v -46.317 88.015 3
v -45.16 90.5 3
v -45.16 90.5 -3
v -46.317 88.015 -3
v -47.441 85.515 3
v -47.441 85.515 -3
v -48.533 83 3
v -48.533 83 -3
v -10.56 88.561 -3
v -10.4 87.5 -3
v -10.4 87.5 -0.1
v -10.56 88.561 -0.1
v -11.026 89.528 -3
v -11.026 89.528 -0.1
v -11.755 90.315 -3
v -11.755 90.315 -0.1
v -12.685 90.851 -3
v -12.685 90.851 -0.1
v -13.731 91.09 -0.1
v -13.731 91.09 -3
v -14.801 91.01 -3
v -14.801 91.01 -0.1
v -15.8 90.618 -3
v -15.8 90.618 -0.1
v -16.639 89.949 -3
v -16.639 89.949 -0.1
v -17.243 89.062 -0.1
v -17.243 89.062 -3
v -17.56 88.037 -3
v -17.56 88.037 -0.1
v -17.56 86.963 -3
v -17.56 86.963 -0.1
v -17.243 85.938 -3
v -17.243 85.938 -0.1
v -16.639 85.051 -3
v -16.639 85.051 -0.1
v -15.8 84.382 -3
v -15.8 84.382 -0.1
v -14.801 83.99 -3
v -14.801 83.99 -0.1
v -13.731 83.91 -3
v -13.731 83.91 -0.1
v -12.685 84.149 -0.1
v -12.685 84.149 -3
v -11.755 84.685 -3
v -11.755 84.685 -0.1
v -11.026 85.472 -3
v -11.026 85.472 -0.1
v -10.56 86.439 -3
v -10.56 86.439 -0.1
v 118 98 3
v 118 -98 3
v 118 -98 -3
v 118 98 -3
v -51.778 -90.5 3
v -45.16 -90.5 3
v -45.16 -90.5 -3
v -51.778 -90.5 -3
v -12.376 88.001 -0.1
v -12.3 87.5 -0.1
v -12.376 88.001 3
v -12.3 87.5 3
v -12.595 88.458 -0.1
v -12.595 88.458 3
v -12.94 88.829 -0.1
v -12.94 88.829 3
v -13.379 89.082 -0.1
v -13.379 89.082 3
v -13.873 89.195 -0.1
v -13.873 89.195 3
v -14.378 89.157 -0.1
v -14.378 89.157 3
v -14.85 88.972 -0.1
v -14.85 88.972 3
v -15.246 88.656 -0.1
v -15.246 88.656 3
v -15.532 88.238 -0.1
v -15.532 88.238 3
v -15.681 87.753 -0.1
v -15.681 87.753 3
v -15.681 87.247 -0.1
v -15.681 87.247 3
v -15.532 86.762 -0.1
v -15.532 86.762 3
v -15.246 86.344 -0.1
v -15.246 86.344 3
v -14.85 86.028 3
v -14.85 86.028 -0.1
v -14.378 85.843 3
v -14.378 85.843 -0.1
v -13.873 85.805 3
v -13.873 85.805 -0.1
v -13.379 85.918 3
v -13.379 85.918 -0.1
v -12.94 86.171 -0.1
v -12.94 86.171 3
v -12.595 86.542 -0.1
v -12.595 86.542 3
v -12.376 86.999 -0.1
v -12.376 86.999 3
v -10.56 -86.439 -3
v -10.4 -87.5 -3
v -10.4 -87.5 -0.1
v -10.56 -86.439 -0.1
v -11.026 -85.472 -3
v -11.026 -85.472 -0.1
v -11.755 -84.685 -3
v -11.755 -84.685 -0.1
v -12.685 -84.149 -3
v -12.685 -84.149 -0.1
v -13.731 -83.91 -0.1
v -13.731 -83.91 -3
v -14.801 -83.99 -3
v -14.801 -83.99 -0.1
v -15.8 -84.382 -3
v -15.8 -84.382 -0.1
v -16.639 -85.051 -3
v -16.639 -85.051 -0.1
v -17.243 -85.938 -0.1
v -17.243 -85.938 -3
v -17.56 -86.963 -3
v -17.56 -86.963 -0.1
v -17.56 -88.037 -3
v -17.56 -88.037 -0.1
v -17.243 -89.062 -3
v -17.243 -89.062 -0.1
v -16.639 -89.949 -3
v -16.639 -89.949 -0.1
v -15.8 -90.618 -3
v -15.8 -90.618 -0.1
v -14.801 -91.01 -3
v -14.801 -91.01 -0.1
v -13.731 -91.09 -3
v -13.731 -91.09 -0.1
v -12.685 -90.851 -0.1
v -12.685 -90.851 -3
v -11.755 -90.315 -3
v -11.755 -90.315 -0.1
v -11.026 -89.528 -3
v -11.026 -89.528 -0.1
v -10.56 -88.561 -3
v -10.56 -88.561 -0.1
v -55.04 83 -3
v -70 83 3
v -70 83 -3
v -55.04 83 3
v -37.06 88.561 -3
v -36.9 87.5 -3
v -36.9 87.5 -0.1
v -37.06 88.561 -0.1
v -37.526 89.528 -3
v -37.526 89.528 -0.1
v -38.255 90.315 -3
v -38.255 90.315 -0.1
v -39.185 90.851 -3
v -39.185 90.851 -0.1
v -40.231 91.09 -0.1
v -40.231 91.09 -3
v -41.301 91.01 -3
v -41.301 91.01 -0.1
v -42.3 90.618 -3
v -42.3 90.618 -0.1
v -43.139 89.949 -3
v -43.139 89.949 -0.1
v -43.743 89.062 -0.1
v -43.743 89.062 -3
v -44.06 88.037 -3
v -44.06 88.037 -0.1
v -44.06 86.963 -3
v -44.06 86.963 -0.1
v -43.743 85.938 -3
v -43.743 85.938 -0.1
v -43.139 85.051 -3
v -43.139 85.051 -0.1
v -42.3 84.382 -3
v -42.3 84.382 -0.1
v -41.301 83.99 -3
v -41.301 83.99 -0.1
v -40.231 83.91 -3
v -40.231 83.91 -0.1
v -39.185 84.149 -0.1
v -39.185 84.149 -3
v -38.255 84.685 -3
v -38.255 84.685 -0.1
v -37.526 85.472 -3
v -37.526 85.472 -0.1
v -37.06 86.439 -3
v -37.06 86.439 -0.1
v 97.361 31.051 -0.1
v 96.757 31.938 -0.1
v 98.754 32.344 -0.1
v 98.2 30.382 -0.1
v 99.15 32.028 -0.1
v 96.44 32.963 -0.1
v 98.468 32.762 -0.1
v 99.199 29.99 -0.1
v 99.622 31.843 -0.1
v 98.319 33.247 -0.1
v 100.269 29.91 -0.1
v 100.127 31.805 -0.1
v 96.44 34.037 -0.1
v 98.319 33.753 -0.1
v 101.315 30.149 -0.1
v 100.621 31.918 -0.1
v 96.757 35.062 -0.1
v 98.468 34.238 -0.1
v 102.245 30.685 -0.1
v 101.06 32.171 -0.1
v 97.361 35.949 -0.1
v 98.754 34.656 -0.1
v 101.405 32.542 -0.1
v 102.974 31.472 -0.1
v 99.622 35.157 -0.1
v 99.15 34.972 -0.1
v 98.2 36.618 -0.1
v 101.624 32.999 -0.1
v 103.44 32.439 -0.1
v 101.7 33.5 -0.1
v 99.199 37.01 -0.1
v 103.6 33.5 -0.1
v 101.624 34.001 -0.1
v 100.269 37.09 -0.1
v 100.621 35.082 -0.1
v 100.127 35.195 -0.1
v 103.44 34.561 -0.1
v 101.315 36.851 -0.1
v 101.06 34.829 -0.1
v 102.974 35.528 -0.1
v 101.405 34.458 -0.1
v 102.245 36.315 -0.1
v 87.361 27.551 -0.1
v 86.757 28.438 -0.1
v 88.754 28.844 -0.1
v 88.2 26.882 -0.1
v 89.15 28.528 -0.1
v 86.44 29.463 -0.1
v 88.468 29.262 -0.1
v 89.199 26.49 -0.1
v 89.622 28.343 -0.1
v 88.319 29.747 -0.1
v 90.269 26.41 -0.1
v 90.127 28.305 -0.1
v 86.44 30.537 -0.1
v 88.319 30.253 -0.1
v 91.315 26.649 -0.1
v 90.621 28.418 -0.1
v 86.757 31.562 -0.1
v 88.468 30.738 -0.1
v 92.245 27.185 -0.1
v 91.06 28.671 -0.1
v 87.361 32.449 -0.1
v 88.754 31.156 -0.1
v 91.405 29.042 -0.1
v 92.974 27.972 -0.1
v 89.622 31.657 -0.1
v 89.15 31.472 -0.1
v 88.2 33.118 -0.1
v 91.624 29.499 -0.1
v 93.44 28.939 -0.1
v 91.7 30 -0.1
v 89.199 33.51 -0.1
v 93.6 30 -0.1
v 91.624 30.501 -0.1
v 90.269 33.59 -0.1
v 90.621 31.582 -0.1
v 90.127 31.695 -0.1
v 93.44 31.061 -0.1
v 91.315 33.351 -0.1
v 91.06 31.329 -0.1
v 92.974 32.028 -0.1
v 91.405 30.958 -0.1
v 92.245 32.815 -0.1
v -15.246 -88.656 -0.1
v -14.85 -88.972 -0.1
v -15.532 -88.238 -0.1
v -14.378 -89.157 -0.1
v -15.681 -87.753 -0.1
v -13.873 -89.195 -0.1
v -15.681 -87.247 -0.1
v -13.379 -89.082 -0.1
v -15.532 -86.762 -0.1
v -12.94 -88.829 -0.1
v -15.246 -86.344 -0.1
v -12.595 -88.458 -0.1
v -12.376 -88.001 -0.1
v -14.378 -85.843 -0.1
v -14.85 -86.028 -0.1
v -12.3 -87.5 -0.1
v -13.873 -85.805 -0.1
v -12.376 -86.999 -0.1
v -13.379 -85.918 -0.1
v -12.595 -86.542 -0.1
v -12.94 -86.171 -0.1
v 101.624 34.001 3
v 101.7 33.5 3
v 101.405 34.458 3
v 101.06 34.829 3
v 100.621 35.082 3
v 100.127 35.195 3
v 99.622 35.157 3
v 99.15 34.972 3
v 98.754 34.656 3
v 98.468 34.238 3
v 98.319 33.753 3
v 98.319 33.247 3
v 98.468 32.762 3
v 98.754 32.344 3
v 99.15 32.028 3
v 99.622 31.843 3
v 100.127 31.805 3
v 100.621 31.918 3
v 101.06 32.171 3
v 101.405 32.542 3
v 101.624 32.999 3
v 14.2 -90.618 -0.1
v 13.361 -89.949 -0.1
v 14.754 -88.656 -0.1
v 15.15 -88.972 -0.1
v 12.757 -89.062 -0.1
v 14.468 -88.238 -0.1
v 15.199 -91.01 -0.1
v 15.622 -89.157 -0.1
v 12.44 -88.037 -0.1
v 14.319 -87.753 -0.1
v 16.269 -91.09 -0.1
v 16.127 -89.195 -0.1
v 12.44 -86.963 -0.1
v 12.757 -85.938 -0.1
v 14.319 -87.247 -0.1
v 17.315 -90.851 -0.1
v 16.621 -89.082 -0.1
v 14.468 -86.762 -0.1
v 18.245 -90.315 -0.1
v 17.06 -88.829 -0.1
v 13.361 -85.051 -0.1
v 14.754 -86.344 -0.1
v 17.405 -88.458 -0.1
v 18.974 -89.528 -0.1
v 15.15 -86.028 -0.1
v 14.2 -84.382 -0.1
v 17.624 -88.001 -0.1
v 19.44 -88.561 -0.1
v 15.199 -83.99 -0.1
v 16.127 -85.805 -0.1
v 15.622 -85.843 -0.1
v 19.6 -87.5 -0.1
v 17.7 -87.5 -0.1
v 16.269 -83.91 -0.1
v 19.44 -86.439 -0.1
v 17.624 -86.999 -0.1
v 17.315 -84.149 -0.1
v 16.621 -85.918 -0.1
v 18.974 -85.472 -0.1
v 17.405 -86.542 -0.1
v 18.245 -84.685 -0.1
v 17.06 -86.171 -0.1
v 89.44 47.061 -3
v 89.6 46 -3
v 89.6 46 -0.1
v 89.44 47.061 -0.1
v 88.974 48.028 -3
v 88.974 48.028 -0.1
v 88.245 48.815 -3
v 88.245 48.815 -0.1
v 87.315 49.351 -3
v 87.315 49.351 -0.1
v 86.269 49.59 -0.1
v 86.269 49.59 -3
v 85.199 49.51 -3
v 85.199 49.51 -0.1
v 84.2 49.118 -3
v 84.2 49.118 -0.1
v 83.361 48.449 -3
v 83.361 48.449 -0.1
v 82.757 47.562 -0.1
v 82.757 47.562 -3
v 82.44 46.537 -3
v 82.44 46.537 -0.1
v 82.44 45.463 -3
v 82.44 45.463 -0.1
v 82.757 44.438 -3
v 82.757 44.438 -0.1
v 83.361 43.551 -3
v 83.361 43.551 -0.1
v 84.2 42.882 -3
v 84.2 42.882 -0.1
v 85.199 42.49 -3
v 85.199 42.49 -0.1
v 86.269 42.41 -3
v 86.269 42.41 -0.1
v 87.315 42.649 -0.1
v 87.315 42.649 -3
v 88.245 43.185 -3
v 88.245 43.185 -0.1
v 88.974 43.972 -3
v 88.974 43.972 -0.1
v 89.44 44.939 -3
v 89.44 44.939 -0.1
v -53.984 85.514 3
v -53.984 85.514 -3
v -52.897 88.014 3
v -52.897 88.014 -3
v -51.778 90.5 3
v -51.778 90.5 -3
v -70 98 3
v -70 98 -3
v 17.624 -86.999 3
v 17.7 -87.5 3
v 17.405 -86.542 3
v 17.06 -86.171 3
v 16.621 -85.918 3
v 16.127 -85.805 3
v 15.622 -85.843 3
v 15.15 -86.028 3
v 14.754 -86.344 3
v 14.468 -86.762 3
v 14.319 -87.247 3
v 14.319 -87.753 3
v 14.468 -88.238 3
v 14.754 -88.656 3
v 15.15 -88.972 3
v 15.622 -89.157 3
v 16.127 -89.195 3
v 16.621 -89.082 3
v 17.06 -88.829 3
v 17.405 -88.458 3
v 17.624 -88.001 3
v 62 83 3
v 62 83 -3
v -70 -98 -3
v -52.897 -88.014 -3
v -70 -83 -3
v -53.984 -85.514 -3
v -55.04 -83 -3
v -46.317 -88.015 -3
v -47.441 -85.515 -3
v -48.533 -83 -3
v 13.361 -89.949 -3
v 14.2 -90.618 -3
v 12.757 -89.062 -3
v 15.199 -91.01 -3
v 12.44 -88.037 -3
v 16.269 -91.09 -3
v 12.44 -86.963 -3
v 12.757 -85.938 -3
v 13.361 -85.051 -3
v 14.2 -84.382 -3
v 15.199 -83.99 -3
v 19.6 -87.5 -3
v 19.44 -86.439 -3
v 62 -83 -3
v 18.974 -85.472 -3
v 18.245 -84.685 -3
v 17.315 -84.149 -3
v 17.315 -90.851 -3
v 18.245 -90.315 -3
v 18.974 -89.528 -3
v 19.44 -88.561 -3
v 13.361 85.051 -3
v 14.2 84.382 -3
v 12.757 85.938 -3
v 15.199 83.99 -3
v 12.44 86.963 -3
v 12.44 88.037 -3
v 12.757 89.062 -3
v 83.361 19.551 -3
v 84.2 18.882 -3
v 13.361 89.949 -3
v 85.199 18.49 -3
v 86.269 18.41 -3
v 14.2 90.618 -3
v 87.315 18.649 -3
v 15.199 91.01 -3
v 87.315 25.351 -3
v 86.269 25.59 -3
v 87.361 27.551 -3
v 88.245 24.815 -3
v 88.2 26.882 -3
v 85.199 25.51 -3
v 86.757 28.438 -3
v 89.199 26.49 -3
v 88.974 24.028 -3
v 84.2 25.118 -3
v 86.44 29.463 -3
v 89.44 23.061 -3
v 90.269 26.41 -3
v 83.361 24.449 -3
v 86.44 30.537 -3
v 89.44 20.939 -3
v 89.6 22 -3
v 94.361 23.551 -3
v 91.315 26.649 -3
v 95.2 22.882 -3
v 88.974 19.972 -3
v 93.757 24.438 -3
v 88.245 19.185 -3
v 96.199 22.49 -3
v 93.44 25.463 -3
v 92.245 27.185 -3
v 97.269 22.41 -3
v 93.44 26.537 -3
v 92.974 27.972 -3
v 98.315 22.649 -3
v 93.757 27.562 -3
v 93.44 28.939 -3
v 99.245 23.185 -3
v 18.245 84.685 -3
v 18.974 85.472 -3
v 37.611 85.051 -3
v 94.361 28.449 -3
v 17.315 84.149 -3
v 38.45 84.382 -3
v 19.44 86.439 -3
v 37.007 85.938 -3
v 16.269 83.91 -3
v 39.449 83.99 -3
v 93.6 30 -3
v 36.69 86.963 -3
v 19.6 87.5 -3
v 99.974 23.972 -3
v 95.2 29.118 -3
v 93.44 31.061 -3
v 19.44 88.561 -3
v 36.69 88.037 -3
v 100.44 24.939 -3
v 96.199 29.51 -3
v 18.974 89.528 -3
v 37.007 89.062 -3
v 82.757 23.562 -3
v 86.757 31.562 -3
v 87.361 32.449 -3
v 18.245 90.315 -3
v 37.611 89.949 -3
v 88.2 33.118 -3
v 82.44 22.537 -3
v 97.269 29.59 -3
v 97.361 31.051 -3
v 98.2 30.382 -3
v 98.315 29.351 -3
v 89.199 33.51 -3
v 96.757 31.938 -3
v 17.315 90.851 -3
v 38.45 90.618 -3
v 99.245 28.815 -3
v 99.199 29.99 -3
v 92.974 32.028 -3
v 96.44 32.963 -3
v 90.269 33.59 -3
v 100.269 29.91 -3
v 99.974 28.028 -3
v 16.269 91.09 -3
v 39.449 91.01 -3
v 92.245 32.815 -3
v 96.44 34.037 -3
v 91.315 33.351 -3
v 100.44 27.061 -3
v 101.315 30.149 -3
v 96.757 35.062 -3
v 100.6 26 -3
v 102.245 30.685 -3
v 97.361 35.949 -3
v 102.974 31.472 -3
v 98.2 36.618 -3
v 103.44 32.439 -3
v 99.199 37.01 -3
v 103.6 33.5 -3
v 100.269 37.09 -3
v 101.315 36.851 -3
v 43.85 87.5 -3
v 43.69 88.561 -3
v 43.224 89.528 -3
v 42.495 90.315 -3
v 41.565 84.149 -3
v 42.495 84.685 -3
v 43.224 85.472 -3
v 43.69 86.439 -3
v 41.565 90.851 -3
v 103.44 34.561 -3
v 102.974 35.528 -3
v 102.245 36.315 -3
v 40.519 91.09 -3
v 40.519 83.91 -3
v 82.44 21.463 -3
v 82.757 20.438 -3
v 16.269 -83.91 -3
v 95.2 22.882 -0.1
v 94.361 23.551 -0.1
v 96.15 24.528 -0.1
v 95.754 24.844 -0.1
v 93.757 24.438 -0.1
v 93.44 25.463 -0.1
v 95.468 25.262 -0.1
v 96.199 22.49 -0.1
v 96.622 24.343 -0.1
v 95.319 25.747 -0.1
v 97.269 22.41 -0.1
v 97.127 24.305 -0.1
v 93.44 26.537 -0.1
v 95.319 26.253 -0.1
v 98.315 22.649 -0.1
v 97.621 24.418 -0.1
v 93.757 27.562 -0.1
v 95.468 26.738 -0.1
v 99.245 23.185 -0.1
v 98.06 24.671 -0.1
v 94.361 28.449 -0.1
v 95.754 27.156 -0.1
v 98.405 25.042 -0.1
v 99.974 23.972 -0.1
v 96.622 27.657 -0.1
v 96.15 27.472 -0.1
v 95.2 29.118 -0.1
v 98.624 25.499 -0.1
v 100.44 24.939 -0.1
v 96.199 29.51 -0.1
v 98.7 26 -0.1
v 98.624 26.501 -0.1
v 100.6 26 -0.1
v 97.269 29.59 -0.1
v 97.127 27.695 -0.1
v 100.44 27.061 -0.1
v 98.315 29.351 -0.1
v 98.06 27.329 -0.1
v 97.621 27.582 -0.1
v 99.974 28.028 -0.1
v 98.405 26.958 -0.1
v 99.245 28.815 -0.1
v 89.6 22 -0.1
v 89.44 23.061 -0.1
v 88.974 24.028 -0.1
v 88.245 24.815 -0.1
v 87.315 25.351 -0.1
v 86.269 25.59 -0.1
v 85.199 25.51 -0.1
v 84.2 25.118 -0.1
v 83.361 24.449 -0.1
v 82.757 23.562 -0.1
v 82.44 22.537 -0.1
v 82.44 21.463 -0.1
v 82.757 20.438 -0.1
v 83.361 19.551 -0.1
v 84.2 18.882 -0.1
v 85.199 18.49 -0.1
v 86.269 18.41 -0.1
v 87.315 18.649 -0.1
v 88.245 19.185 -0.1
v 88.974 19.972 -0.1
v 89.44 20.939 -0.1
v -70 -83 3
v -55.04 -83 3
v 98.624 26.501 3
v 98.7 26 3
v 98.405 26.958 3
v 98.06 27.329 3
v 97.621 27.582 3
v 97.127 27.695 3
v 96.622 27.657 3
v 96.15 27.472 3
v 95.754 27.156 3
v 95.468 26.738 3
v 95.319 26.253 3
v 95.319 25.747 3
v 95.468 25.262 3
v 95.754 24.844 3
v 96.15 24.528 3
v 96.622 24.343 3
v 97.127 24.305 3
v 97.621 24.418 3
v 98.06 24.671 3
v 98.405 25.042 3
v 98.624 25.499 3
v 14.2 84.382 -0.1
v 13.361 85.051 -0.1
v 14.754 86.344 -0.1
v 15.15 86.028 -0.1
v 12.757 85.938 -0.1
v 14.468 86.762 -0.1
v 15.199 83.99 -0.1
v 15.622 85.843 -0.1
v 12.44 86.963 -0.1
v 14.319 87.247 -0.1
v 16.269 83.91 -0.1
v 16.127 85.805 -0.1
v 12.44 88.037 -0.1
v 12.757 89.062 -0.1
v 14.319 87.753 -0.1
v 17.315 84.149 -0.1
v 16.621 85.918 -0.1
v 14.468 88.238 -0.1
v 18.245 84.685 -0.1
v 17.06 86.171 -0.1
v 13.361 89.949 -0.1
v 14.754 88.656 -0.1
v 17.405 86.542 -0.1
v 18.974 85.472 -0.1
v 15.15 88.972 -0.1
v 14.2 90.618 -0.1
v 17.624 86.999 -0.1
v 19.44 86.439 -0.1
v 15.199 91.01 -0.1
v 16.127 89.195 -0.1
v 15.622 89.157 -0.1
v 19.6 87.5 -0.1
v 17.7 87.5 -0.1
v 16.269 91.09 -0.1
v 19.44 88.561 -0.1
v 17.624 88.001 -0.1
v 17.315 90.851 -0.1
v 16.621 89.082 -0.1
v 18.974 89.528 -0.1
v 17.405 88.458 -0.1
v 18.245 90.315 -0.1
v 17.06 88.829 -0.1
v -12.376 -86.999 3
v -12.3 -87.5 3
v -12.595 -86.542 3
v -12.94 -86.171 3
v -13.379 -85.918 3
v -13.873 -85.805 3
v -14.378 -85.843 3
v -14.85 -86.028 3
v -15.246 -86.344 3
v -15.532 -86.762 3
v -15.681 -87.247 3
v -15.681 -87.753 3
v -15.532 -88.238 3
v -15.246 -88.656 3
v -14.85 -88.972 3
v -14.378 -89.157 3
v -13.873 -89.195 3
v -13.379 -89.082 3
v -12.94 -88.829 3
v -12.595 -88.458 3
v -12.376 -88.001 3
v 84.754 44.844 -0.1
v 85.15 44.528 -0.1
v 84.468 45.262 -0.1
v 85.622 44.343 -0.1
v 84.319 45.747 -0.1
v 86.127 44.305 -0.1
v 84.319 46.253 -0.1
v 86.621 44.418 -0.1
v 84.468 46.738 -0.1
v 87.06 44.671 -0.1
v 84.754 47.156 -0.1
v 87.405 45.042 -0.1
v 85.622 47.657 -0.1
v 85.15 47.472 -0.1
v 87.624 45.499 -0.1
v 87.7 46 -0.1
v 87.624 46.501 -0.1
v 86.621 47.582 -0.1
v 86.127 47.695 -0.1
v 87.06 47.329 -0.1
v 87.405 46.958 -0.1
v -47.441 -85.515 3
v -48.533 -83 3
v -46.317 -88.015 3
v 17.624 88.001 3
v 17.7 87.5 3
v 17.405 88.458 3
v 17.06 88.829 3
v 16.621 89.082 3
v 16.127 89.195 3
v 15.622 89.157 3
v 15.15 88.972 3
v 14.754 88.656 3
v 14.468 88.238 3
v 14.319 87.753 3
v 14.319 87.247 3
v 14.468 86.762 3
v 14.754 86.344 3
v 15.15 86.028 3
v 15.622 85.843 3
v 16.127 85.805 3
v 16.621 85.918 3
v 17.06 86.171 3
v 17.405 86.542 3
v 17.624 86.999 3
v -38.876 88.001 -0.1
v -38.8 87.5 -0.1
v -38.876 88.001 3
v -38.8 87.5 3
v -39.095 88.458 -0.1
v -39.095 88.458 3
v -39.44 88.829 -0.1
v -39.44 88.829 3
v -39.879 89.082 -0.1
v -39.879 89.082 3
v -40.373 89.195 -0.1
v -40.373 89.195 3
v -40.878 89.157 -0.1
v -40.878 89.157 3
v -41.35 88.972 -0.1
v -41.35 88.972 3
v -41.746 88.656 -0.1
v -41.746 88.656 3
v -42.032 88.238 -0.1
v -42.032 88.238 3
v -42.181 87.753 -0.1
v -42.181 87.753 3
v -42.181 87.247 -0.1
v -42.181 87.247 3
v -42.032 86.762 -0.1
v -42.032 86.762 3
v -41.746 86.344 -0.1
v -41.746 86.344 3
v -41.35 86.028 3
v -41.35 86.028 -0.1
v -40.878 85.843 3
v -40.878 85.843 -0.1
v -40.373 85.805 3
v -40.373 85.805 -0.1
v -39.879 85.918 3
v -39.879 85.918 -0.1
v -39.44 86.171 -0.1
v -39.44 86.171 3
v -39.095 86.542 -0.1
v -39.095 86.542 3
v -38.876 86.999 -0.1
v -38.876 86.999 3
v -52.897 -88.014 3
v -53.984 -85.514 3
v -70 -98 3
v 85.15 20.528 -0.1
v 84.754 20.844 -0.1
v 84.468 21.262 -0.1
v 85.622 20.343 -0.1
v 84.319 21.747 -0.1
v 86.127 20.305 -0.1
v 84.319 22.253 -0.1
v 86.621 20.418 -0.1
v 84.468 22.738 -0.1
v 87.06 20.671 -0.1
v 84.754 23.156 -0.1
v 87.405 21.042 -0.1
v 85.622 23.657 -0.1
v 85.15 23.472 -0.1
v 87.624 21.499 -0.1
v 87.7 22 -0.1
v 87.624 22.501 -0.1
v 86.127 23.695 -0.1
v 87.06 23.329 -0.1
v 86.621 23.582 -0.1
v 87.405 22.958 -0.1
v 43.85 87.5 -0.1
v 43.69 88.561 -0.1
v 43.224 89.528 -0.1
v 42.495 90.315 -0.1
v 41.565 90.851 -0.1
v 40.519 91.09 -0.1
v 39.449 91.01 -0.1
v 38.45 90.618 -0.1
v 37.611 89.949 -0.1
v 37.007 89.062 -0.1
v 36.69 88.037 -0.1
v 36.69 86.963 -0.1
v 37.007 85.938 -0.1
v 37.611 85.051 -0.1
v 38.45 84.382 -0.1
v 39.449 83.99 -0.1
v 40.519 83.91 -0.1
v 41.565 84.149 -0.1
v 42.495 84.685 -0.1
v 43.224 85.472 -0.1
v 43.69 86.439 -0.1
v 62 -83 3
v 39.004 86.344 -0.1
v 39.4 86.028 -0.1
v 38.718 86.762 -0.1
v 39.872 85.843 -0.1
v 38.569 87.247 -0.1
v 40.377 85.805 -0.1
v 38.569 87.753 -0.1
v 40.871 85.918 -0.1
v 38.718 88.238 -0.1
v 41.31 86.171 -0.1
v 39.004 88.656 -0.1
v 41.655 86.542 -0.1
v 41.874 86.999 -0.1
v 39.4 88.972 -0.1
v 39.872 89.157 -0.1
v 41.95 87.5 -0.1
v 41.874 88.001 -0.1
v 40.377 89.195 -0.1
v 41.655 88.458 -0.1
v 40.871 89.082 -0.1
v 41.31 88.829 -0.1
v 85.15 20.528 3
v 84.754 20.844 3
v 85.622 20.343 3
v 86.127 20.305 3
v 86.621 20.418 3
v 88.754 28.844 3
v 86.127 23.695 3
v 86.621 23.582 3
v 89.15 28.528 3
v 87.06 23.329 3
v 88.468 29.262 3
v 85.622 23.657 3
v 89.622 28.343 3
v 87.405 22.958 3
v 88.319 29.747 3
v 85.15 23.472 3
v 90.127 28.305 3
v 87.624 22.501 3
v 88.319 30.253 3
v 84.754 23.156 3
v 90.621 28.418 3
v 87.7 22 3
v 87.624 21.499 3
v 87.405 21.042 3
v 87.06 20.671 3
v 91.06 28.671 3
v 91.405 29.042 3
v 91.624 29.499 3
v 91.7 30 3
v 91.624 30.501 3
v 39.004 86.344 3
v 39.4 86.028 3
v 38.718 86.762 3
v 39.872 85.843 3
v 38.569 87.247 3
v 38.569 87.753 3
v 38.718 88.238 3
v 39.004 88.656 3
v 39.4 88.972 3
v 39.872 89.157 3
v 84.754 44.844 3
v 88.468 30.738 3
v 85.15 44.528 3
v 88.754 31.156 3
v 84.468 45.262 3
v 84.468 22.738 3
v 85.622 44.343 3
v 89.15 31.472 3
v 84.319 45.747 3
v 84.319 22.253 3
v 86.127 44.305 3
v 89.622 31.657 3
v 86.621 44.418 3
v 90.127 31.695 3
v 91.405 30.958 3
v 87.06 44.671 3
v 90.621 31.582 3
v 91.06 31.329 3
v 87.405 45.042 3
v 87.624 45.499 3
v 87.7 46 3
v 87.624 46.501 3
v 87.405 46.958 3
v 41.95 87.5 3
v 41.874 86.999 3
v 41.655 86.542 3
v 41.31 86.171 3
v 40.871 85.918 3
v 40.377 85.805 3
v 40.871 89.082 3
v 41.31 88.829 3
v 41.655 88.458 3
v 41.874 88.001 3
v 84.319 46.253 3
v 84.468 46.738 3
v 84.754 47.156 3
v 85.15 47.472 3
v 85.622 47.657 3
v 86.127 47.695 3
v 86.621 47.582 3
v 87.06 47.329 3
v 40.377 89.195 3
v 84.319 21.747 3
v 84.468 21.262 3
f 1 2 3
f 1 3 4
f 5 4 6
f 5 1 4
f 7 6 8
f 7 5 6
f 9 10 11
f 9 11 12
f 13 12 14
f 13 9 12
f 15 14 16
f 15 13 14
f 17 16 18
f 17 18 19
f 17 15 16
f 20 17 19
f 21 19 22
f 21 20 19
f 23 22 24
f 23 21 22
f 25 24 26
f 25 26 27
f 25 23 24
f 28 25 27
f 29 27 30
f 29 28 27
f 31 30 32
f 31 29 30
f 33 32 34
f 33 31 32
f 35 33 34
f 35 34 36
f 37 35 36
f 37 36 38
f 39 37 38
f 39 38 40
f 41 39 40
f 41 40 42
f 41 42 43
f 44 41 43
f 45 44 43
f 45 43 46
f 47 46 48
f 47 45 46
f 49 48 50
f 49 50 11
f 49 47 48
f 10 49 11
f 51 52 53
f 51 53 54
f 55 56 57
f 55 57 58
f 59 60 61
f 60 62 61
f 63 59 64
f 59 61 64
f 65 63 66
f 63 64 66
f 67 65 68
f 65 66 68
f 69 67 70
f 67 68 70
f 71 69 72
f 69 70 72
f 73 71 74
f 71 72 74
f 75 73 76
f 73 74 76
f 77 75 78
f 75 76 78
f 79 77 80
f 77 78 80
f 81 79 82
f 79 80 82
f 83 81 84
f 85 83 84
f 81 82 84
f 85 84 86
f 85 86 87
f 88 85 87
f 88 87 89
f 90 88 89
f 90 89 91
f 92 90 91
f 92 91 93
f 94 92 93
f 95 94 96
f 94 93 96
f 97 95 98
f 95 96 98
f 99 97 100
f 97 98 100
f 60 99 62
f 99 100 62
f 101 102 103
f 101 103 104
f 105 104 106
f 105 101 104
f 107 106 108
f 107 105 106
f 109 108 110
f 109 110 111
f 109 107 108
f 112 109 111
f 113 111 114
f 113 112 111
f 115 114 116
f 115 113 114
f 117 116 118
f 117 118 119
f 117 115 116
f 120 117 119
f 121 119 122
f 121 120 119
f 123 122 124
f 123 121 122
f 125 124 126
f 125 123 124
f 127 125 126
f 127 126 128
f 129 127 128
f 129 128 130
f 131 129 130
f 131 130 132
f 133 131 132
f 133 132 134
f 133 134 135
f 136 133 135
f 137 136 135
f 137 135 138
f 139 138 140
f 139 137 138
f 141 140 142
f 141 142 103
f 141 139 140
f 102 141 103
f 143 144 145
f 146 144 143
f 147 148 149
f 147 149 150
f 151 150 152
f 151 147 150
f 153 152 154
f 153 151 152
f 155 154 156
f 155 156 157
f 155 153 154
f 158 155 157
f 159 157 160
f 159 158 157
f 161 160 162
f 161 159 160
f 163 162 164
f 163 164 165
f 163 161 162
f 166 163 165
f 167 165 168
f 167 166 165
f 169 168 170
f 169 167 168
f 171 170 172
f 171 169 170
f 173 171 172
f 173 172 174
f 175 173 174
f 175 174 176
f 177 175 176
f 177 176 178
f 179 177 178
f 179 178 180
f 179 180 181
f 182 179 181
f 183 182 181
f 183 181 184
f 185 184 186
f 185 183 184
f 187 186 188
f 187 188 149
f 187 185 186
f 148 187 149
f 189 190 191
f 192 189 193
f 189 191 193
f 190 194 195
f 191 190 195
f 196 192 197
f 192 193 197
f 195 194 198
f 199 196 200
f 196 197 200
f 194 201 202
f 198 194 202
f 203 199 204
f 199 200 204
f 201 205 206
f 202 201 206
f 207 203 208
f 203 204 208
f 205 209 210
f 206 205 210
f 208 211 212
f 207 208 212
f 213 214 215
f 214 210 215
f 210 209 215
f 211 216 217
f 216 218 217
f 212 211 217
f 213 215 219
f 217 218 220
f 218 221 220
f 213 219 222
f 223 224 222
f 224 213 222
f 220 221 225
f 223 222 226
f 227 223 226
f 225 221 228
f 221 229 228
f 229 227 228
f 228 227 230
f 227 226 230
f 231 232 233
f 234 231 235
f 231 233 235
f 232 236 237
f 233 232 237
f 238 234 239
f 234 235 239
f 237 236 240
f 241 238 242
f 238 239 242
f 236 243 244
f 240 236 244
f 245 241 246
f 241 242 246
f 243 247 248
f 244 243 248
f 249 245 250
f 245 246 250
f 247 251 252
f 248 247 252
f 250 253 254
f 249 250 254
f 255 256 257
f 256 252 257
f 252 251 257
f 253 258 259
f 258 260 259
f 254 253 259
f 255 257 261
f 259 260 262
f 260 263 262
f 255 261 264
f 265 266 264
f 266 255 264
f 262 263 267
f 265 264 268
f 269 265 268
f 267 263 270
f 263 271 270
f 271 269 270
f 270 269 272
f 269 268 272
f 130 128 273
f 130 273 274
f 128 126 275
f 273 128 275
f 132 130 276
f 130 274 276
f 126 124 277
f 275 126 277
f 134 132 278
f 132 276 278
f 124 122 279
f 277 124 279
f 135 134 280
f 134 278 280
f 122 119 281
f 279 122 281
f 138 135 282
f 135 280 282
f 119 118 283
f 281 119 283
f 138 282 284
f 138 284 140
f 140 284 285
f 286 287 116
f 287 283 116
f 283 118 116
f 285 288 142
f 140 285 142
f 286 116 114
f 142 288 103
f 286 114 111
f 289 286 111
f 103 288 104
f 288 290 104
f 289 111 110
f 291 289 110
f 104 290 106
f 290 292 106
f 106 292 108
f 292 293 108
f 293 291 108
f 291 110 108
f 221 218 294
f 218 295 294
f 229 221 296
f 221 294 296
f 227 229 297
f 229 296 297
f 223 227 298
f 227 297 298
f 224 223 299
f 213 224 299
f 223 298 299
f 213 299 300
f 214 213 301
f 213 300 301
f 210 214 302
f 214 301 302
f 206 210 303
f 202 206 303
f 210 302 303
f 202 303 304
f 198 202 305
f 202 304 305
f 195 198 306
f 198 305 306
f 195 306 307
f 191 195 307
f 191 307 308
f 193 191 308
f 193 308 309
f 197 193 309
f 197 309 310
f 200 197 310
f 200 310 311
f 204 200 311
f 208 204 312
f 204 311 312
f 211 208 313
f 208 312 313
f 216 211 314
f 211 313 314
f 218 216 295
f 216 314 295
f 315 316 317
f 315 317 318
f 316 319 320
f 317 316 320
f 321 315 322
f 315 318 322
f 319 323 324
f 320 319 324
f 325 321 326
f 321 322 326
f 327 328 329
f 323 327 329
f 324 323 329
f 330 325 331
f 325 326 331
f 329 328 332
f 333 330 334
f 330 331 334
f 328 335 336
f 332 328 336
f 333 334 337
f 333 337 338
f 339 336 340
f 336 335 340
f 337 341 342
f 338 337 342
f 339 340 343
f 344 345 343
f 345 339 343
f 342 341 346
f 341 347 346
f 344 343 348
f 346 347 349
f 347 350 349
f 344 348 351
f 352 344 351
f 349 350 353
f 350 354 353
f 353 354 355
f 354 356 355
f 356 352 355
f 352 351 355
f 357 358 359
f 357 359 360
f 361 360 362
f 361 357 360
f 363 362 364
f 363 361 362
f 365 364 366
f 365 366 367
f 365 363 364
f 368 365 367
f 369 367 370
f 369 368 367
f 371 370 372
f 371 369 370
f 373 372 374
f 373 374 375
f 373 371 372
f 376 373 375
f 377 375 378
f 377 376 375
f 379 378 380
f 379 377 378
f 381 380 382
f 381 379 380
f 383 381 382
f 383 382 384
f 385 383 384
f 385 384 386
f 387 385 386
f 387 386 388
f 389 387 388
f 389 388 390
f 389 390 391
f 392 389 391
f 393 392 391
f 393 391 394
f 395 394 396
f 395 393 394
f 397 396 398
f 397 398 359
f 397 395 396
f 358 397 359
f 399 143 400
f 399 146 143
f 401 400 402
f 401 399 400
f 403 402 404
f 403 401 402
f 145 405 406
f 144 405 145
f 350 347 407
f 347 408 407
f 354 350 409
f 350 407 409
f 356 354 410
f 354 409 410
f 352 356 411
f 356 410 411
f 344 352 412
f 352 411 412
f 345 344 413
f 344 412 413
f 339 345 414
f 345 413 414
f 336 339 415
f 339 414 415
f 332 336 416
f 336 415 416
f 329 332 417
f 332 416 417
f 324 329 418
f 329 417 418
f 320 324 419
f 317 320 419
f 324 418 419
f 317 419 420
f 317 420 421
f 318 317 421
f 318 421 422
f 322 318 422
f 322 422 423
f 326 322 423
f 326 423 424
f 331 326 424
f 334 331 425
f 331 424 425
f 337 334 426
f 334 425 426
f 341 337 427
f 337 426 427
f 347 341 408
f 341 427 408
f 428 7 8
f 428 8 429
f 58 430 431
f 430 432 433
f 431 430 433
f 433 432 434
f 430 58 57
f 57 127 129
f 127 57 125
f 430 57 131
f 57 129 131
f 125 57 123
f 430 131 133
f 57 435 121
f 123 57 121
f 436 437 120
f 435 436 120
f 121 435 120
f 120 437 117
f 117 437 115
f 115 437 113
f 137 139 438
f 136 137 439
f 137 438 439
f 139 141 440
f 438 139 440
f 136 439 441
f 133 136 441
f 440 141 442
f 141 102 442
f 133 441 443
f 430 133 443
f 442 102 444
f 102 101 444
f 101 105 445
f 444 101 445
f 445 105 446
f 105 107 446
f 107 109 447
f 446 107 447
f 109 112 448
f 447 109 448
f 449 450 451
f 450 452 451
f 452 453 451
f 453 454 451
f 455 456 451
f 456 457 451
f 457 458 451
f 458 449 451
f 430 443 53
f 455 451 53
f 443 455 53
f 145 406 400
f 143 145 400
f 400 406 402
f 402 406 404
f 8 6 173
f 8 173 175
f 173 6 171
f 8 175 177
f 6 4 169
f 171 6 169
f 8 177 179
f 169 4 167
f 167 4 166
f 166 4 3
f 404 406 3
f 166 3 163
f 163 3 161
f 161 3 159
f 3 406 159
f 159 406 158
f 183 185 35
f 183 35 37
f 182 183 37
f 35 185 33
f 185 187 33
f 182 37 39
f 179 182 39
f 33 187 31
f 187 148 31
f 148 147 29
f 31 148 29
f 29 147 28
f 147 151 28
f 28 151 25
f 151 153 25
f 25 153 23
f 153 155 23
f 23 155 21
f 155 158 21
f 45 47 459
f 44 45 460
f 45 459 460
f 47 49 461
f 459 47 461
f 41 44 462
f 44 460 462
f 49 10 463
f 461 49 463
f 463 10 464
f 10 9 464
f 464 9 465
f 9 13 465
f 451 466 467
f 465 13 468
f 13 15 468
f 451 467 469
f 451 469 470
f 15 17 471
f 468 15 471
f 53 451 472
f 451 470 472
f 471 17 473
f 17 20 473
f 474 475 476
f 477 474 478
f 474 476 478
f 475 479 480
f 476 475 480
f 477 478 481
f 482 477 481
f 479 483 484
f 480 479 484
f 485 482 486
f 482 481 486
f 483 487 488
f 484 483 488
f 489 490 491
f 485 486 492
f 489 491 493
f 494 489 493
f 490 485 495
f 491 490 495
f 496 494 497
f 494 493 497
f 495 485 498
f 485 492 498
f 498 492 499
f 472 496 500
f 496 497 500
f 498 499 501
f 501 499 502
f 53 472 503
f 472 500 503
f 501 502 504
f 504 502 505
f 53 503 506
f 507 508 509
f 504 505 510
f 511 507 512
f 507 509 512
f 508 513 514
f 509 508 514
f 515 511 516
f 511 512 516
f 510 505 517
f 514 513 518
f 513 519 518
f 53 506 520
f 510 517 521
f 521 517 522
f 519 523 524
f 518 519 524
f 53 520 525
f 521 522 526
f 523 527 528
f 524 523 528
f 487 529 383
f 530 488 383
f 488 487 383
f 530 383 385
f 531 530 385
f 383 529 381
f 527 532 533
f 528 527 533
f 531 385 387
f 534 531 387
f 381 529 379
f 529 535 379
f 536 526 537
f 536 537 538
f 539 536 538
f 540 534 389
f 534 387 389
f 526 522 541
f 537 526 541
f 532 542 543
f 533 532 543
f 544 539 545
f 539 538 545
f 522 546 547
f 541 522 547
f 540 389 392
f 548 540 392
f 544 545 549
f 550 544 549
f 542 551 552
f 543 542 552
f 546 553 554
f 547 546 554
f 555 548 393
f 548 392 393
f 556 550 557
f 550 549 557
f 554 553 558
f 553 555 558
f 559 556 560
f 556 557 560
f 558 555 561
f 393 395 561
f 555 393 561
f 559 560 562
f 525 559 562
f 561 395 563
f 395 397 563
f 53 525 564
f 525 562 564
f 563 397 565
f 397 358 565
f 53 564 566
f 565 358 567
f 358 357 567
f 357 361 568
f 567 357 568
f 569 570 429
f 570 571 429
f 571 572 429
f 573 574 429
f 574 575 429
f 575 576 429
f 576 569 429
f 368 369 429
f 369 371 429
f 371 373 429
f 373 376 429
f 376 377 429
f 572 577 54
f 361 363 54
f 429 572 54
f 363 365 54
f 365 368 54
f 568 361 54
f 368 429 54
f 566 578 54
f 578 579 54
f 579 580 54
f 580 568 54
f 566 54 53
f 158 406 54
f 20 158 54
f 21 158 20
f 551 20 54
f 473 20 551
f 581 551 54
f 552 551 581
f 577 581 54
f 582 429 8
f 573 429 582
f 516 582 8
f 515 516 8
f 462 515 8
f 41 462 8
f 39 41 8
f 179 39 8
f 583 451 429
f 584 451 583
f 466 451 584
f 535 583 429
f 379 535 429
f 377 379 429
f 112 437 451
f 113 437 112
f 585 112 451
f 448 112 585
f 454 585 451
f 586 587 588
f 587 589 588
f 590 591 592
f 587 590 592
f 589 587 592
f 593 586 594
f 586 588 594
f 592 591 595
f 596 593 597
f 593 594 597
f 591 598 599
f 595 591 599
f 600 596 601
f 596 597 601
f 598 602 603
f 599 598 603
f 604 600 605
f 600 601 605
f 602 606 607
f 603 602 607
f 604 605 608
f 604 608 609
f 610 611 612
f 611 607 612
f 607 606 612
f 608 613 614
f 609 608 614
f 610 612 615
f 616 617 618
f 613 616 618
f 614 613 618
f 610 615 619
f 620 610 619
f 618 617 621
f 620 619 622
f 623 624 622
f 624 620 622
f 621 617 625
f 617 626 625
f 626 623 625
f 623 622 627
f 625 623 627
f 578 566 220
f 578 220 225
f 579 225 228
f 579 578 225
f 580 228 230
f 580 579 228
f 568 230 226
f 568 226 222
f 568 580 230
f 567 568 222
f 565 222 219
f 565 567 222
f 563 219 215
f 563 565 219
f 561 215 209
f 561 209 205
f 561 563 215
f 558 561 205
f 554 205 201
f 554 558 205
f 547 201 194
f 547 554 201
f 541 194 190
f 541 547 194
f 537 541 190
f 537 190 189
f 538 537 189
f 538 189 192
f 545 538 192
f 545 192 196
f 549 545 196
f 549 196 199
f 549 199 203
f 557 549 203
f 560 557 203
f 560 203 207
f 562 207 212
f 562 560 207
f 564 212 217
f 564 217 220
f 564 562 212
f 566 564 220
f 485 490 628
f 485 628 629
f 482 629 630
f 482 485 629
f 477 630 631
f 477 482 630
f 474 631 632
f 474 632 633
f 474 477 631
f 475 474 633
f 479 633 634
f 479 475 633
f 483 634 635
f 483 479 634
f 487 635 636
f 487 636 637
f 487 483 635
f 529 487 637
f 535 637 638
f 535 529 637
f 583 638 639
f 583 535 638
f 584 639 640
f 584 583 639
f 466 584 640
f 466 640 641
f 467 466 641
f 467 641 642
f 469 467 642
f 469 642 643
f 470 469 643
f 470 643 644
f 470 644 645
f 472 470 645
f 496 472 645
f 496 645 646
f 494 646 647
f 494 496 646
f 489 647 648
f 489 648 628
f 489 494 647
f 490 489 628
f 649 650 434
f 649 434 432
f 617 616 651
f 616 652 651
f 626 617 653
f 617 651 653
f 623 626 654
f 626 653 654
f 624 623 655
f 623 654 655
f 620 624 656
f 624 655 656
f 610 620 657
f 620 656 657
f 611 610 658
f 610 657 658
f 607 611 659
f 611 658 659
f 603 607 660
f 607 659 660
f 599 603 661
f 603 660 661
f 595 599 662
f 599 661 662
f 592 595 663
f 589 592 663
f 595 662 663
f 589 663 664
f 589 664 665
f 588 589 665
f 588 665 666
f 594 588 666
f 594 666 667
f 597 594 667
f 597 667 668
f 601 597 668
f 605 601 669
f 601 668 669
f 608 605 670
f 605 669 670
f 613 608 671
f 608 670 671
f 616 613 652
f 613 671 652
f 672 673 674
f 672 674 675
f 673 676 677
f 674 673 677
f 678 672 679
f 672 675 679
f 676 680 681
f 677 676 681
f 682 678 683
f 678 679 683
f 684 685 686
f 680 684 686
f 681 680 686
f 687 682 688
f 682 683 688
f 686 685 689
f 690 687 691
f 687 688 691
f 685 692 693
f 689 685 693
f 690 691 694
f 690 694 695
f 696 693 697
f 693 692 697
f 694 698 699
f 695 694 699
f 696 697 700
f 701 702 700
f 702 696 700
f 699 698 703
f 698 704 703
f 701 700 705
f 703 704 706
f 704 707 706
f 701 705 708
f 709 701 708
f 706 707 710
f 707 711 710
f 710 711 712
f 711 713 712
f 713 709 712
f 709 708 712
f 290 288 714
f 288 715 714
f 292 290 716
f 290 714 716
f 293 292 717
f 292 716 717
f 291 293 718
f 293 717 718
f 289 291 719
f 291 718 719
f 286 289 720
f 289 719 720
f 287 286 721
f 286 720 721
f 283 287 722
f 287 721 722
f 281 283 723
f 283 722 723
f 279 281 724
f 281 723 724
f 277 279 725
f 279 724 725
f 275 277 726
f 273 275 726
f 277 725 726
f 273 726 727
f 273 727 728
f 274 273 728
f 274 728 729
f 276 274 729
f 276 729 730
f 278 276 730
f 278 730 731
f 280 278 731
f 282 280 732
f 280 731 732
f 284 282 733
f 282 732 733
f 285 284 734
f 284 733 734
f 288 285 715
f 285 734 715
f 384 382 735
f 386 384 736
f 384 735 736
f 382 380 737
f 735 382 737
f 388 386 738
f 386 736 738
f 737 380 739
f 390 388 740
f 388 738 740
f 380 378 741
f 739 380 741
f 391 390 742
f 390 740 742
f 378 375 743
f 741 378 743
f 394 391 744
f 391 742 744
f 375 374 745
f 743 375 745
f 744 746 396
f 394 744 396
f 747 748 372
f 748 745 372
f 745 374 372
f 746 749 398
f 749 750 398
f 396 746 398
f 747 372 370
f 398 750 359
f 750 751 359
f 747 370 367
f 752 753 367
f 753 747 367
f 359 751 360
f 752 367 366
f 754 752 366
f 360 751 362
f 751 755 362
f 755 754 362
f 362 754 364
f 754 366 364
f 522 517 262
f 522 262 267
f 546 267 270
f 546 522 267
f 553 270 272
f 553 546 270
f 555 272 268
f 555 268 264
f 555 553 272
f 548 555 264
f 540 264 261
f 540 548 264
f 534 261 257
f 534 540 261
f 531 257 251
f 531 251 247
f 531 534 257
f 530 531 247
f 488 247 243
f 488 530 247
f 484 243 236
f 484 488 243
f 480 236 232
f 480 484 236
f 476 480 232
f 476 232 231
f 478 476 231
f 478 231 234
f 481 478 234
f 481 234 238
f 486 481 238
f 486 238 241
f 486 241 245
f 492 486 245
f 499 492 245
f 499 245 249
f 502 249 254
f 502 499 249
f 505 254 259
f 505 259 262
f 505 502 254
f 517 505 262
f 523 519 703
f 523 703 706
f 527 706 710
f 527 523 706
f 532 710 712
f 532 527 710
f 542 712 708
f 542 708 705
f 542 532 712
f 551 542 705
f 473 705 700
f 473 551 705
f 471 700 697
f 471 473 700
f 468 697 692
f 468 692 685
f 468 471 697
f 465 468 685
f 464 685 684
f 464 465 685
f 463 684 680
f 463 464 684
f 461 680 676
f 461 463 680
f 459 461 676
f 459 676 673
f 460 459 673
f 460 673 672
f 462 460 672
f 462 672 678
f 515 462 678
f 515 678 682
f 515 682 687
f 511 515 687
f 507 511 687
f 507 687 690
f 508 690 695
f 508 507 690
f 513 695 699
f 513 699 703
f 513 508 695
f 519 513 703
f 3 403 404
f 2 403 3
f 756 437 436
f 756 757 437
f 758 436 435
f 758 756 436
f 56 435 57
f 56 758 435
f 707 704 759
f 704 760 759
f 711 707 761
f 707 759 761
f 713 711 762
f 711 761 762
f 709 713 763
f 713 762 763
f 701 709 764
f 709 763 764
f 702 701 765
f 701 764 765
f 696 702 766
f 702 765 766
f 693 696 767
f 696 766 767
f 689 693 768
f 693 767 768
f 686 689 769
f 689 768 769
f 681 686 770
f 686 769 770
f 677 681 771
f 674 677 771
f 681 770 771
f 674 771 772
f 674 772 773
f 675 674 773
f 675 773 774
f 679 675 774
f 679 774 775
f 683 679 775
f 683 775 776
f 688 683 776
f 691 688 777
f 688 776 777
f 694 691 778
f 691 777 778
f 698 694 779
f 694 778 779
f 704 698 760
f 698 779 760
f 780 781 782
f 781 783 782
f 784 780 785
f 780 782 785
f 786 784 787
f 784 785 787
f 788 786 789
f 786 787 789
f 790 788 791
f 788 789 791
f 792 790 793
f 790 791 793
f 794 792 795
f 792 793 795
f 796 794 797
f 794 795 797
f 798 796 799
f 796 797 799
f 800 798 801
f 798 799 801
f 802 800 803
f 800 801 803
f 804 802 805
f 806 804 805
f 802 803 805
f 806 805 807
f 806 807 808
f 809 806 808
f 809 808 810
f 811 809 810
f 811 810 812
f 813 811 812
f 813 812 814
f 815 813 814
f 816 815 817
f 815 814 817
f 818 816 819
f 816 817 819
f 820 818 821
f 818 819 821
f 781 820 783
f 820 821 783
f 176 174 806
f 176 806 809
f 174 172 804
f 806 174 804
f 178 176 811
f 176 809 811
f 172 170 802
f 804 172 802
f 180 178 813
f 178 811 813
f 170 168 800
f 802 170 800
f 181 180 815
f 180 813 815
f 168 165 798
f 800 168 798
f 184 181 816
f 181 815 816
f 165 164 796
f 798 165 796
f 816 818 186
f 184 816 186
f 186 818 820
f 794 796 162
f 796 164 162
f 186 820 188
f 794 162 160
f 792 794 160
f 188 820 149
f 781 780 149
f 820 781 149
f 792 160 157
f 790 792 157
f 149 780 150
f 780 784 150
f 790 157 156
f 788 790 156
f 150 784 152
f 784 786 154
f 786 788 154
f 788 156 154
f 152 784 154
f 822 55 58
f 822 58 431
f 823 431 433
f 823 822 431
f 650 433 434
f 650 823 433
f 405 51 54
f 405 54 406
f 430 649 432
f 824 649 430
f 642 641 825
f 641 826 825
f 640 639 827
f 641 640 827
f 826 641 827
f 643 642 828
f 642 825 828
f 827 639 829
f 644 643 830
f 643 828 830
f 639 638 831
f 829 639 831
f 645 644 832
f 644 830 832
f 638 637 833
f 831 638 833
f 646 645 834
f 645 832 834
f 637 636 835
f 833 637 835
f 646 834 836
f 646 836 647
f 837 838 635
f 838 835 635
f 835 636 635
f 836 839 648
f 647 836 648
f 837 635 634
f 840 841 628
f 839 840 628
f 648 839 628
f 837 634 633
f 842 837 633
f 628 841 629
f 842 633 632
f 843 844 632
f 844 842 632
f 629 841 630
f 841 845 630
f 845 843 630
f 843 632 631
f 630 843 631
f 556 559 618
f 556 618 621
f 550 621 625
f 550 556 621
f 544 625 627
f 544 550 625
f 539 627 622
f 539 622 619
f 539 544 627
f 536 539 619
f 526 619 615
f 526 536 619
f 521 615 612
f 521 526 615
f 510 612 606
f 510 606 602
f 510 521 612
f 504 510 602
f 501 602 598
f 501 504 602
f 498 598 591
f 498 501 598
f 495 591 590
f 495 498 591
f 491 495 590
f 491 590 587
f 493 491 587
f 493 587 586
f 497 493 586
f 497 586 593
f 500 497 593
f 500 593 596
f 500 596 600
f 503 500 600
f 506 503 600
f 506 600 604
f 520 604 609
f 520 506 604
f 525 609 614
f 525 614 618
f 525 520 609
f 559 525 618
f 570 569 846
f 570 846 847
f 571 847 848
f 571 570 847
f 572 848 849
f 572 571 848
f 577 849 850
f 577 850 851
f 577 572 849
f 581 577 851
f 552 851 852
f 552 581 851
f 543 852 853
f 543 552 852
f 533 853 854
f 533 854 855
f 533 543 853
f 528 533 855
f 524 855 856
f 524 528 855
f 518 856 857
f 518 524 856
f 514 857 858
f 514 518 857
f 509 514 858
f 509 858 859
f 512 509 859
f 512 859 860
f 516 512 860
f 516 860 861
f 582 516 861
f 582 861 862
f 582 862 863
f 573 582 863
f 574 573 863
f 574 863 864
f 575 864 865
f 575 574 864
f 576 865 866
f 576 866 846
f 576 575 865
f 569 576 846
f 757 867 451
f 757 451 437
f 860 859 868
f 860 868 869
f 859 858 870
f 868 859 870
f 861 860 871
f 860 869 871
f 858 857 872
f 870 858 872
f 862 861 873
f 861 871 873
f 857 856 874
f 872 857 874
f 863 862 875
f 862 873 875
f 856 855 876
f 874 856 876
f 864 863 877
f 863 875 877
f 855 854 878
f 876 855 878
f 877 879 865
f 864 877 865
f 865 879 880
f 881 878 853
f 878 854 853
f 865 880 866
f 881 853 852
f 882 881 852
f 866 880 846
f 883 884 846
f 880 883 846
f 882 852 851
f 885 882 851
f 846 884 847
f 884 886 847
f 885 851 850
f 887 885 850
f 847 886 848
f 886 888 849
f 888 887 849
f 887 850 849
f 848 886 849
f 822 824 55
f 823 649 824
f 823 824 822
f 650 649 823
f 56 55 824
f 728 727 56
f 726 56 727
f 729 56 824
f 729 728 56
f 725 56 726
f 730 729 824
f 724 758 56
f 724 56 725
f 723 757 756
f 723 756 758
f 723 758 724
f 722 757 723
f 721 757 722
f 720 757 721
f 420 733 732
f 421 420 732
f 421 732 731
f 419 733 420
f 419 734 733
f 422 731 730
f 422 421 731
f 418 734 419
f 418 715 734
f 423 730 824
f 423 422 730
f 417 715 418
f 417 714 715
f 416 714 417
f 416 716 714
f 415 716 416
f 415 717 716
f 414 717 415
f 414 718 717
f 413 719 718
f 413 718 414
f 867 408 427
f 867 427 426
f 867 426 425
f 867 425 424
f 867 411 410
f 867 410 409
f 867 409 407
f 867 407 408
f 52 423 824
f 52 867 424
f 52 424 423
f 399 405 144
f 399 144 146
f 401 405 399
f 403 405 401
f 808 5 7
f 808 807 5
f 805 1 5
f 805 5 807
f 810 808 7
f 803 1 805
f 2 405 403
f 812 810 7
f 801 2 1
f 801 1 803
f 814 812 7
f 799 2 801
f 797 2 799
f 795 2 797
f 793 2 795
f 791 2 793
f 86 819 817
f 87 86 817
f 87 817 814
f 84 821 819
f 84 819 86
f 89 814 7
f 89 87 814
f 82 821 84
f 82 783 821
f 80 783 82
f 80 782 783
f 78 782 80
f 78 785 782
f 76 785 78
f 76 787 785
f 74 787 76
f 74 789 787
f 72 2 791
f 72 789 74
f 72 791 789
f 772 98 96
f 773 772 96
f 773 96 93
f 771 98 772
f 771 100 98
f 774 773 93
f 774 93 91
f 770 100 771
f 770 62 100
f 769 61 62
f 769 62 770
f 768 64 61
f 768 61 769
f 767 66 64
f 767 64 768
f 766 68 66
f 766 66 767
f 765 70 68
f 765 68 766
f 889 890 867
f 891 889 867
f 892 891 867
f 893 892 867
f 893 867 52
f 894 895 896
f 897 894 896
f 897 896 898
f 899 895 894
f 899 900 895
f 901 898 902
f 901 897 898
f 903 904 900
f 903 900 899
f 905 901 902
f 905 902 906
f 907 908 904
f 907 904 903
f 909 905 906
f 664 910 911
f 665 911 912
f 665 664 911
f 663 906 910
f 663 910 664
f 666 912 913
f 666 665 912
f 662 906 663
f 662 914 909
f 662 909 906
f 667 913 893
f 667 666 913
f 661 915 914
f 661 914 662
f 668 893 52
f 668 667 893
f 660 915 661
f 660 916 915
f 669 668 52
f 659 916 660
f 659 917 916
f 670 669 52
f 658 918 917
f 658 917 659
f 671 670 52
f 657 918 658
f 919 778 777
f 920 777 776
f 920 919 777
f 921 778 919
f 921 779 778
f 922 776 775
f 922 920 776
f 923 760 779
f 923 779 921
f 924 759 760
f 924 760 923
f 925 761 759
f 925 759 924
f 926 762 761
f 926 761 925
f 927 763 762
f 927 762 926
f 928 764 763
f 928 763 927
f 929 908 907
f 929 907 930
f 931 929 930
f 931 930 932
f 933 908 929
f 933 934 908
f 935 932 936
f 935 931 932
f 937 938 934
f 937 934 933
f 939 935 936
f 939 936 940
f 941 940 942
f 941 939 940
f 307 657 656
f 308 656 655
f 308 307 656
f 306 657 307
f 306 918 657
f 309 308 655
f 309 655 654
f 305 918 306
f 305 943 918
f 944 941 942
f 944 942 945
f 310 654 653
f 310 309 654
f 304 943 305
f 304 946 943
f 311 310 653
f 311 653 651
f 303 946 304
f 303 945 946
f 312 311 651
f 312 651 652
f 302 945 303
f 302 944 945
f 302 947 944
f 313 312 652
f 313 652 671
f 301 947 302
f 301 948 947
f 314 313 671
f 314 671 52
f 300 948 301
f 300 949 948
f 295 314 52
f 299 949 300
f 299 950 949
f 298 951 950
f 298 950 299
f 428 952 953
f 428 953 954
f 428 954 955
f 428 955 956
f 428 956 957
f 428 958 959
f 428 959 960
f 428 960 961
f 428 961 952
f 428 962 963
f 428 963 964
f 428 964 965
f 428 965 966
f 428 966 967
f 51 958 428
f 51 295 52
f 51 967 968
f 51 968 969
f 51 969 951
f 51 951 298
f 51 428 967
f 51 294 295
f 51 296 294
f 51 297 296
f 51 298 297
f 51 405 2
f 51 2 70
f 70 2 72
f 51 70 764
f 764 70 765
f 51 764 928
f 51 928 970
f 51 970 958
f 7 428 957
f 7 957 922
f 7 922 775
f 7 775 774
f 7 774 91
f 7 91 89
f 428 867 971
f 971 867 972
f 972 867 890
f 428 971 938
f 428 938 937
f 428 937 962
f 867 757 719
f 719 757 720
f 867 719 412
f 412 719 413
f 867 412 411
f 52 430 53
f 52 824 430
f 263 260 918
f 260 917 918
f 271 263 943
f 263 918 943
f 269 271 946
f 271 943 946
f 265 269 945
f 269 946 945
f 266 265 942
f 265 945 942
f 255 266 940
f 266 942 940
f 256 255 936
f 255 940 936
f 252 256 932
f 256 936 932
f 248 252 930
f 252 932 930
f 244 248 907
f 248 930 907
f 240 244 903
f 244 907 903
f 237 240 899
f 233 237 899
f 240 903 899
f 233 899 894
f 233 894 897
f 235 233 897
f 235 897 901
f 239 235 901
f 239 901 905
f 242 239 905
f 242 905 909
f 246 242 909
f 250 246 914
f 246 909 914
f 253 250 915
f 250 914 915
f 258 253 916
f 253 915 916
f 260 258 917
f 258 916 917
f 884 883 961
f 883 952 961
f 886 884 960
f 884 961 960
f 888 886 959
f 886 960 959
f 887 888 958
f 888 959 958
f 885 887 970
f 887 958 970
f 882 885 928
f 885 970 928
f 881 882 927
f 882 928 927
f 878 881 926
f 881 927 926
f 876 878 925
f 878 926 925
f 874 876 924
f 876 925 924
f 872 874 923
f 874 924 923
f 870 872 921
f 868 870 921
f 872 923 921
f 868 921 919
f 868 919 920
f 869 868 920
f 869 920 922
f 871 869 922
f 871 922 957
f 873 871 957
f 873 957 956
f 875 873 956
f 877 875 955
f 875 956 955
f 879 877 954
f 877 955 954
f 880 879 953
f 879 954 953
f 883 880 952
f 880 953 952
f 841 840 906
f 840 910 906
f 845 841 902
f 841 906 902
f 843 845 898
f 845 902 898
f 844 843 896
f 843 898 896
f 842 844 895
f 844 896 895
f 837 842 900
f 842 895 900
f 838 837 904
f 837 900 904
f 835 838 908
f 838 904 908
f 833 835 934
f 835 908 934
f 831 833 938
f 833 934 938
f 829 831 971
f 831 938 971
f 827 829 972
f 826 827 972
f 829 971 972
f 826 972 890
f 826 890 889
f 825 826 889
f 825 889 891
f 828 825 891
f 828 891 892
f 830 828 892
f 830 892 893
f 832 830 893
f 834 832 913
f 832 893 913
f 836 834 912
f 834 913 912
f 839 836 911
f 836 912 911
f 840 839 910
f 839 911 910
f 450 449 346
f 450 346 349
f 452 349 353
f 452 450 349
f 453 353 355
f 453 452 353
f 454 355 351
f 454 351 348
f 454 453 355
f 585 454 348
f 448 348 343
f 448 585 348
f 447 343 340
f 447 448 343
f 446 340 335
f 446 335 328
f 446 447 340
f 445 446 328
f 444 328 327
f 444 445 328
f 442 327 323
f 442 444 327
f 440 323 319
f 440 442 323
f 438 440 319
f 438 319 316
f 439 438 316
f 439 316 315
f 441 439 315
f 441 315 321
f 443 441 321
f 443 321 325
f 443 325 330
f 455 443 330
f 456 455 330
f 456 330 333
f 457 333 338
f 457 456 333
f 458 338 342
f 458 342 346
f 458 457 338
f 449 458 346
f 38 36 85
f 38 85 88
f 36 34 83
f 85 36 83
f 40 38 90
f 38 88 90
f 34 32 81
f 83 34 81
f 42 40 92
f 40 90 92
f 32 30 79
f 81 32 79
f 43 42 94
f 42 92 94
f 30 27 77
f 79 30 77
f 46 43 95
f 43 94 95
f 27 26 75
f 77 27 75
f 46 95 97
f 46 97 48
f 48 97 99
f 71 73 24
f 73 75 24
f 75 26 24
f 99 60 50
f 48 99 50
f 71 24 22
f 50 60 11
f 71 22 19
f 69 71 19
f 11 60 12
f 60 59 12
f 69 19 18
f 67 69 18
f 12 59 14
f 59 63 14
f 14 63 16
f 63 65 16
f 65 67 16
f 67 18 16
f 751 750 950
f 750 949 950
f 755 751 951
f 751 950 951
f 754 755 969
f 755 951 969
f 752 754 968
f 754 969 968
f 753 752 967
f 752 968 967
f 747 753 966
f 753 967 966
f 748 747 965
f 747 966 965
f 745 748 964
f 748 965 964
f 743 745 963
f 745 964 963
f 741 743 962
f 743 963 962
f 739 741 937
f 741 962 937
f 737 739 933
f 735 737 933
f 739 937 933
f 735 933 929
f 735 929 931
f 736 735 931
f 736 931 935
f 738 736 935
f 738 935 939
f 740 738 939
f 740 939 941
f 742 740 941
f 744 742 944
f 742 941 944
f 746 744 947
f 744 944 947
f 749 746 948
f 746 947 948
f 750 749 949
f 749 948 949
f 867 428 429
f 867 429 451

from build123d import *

# Parameters (mm, degrees)
BENCH_FRAME_EXTRUDE_DEPTH    = 3
CURVED_PANEL_CLEARANCE_DEPTH = 4
POD_FOOT_CLEARANCE_SKETCH_R  = 1.7
POD_FOOT_THROUGH_HOLES_DEPTH = 4
FOOT_COUNTERBORE_SKETCH_R    = 3.6
FOOT_COUNTERBORES_DEPTH      = 2.9


with BuildPart() as part:
    # Bench Frame Sketch → Bench Frame Extrude (new, symmetric)
    with BuildSketch(Plane.XY):
        Polygon((-70, -98), (118, -98), (118, 98), (-70, 98), (-70, 83), (62, 83), (62, -83), (-70, -83), align=None)
    extrude(amount=BENCH_FRAME_EXTRUDE_DEPTH, both=True)

    # Curved Panel Clearance Sketch → Curved Panel Clearance (cut, symmetric)
    with BuildSketch(Plane.XY):
        with BuildLine():
            Line((-51.777652934, 90.5), (-45.159619167, 90.5))
            ThreePointArc((-45.159619167, 90.5), (-65.5, 0), (-45.159619167, -90.5))
            Line((-45.159619167, -90.5), (-51.777652934, -90.5))
            ThreePointArc((-51.777652934, -90.5), (-71.5, 0), (-51.777652934, 90.5))
        make_face()
    extrude(amount=CURVED_PANEL_CLEARANCE_DEPTH, both=True, mode=Mode.SUBTRACT)

    # Pod Foot Clearance Sketch → Pod Foot Through Holes (cut, symmetric)
    with BuildSketch(Plane.XY):
        with Locations((-14, -87.5)):
            Circle(POD_FOOT_CLEARANCE_SKETCH_R)
        with Locations((16, -87.5)):
            Circle(POD_FOOT_CLEARANCE_SKETCH_R)
        with Locations((-14, 87.5)):
            Circle(POD_FOOT_CLEARANCE_SKETCH_R)
        with Locations((16, 87.5)):
            Circle(POD_FOOT_CLEARANCE_SKETCH_R)
        with Locations((40.25, 87.5)):
            Circle(POD_FOOT_CLEARANCE_SKETCH_R)
        with Locations((-40.5, 87.5)):
            Circle(POD_FOOT_CLEARANCE_SKETCH_R)
        with Locations((86, 22)):
            Circle(POD_FOOT_CLEARANCE_SKETCH_R)
        with Locations((86, 46)):
            Circle(POD_FOOT_CLEARANCE_SKETCH_R)
        with Locations((90, 30)):
            Circle(POD_FOOT_CLEARANCE_SKETCH_R)
        with Locations((97, 26)):
            Circle(POD_FOOT_CLEARANCE_SKETCH_R)
        with Locations((100, 33.5)):
            Circle(POD_FOOT_CLEARANCE_SKETCH_R)
    extrude(amount=POD_FOOT_THROUGH_HOLES_DEPTH, both=True, mode=Mode.SUBTRACT)

    # Foot Counterbore Sketch → Foot Counterbores (cut)
    with BuildSketch(Plane.XY.offset(-3)):
        with Locations((-14, -87.5)):
            Circle(FOOT_COUNTERBORE_SKETCH_R)
        with Locations((16, -87.5)):
            Circle(FOOT_COUNTERBORE_SKETCH_R)
        with Locations((-14, 87.5)):
            Circle(FOOT_COUNTERBORE_SKETCH_R)
        with Locations((16, 87.5)):
            Circle(FOOT_COUNTERBORE_SKETCH_R)
        with Locations((40.25, 87.5)):
            Circle(FOOT_COUNTERBORE_SKETCH_R)
        with Locations((-40.5, 87.5)):
            Circle(FOOT_COUNTERBORE_SKETCH_R)
        with Locations((86, 22)):
            Circle(FOOT_COUNTERBORE_SKETCH_R)
        with Locations((86, 46)):
            Circle(FOOT_COUNTERBORE_SKETCH_R)
        with Locations((90, 30)):
            Circle(FOOT_COUNTERBORE_SKETCH_R)
        with Locations((97, 26)):
            Circle(FOOT_COUNTERBORE_SKETCH_R)
        with Locations((100, 33.5)):
            Circle(FOOT_COUNTERBORE_SKETCH_R)
    extrude(amount=FOOT_COUNTERBORES_DEPTH, mode=Mode.SUBTRACT)


solid = part.part
